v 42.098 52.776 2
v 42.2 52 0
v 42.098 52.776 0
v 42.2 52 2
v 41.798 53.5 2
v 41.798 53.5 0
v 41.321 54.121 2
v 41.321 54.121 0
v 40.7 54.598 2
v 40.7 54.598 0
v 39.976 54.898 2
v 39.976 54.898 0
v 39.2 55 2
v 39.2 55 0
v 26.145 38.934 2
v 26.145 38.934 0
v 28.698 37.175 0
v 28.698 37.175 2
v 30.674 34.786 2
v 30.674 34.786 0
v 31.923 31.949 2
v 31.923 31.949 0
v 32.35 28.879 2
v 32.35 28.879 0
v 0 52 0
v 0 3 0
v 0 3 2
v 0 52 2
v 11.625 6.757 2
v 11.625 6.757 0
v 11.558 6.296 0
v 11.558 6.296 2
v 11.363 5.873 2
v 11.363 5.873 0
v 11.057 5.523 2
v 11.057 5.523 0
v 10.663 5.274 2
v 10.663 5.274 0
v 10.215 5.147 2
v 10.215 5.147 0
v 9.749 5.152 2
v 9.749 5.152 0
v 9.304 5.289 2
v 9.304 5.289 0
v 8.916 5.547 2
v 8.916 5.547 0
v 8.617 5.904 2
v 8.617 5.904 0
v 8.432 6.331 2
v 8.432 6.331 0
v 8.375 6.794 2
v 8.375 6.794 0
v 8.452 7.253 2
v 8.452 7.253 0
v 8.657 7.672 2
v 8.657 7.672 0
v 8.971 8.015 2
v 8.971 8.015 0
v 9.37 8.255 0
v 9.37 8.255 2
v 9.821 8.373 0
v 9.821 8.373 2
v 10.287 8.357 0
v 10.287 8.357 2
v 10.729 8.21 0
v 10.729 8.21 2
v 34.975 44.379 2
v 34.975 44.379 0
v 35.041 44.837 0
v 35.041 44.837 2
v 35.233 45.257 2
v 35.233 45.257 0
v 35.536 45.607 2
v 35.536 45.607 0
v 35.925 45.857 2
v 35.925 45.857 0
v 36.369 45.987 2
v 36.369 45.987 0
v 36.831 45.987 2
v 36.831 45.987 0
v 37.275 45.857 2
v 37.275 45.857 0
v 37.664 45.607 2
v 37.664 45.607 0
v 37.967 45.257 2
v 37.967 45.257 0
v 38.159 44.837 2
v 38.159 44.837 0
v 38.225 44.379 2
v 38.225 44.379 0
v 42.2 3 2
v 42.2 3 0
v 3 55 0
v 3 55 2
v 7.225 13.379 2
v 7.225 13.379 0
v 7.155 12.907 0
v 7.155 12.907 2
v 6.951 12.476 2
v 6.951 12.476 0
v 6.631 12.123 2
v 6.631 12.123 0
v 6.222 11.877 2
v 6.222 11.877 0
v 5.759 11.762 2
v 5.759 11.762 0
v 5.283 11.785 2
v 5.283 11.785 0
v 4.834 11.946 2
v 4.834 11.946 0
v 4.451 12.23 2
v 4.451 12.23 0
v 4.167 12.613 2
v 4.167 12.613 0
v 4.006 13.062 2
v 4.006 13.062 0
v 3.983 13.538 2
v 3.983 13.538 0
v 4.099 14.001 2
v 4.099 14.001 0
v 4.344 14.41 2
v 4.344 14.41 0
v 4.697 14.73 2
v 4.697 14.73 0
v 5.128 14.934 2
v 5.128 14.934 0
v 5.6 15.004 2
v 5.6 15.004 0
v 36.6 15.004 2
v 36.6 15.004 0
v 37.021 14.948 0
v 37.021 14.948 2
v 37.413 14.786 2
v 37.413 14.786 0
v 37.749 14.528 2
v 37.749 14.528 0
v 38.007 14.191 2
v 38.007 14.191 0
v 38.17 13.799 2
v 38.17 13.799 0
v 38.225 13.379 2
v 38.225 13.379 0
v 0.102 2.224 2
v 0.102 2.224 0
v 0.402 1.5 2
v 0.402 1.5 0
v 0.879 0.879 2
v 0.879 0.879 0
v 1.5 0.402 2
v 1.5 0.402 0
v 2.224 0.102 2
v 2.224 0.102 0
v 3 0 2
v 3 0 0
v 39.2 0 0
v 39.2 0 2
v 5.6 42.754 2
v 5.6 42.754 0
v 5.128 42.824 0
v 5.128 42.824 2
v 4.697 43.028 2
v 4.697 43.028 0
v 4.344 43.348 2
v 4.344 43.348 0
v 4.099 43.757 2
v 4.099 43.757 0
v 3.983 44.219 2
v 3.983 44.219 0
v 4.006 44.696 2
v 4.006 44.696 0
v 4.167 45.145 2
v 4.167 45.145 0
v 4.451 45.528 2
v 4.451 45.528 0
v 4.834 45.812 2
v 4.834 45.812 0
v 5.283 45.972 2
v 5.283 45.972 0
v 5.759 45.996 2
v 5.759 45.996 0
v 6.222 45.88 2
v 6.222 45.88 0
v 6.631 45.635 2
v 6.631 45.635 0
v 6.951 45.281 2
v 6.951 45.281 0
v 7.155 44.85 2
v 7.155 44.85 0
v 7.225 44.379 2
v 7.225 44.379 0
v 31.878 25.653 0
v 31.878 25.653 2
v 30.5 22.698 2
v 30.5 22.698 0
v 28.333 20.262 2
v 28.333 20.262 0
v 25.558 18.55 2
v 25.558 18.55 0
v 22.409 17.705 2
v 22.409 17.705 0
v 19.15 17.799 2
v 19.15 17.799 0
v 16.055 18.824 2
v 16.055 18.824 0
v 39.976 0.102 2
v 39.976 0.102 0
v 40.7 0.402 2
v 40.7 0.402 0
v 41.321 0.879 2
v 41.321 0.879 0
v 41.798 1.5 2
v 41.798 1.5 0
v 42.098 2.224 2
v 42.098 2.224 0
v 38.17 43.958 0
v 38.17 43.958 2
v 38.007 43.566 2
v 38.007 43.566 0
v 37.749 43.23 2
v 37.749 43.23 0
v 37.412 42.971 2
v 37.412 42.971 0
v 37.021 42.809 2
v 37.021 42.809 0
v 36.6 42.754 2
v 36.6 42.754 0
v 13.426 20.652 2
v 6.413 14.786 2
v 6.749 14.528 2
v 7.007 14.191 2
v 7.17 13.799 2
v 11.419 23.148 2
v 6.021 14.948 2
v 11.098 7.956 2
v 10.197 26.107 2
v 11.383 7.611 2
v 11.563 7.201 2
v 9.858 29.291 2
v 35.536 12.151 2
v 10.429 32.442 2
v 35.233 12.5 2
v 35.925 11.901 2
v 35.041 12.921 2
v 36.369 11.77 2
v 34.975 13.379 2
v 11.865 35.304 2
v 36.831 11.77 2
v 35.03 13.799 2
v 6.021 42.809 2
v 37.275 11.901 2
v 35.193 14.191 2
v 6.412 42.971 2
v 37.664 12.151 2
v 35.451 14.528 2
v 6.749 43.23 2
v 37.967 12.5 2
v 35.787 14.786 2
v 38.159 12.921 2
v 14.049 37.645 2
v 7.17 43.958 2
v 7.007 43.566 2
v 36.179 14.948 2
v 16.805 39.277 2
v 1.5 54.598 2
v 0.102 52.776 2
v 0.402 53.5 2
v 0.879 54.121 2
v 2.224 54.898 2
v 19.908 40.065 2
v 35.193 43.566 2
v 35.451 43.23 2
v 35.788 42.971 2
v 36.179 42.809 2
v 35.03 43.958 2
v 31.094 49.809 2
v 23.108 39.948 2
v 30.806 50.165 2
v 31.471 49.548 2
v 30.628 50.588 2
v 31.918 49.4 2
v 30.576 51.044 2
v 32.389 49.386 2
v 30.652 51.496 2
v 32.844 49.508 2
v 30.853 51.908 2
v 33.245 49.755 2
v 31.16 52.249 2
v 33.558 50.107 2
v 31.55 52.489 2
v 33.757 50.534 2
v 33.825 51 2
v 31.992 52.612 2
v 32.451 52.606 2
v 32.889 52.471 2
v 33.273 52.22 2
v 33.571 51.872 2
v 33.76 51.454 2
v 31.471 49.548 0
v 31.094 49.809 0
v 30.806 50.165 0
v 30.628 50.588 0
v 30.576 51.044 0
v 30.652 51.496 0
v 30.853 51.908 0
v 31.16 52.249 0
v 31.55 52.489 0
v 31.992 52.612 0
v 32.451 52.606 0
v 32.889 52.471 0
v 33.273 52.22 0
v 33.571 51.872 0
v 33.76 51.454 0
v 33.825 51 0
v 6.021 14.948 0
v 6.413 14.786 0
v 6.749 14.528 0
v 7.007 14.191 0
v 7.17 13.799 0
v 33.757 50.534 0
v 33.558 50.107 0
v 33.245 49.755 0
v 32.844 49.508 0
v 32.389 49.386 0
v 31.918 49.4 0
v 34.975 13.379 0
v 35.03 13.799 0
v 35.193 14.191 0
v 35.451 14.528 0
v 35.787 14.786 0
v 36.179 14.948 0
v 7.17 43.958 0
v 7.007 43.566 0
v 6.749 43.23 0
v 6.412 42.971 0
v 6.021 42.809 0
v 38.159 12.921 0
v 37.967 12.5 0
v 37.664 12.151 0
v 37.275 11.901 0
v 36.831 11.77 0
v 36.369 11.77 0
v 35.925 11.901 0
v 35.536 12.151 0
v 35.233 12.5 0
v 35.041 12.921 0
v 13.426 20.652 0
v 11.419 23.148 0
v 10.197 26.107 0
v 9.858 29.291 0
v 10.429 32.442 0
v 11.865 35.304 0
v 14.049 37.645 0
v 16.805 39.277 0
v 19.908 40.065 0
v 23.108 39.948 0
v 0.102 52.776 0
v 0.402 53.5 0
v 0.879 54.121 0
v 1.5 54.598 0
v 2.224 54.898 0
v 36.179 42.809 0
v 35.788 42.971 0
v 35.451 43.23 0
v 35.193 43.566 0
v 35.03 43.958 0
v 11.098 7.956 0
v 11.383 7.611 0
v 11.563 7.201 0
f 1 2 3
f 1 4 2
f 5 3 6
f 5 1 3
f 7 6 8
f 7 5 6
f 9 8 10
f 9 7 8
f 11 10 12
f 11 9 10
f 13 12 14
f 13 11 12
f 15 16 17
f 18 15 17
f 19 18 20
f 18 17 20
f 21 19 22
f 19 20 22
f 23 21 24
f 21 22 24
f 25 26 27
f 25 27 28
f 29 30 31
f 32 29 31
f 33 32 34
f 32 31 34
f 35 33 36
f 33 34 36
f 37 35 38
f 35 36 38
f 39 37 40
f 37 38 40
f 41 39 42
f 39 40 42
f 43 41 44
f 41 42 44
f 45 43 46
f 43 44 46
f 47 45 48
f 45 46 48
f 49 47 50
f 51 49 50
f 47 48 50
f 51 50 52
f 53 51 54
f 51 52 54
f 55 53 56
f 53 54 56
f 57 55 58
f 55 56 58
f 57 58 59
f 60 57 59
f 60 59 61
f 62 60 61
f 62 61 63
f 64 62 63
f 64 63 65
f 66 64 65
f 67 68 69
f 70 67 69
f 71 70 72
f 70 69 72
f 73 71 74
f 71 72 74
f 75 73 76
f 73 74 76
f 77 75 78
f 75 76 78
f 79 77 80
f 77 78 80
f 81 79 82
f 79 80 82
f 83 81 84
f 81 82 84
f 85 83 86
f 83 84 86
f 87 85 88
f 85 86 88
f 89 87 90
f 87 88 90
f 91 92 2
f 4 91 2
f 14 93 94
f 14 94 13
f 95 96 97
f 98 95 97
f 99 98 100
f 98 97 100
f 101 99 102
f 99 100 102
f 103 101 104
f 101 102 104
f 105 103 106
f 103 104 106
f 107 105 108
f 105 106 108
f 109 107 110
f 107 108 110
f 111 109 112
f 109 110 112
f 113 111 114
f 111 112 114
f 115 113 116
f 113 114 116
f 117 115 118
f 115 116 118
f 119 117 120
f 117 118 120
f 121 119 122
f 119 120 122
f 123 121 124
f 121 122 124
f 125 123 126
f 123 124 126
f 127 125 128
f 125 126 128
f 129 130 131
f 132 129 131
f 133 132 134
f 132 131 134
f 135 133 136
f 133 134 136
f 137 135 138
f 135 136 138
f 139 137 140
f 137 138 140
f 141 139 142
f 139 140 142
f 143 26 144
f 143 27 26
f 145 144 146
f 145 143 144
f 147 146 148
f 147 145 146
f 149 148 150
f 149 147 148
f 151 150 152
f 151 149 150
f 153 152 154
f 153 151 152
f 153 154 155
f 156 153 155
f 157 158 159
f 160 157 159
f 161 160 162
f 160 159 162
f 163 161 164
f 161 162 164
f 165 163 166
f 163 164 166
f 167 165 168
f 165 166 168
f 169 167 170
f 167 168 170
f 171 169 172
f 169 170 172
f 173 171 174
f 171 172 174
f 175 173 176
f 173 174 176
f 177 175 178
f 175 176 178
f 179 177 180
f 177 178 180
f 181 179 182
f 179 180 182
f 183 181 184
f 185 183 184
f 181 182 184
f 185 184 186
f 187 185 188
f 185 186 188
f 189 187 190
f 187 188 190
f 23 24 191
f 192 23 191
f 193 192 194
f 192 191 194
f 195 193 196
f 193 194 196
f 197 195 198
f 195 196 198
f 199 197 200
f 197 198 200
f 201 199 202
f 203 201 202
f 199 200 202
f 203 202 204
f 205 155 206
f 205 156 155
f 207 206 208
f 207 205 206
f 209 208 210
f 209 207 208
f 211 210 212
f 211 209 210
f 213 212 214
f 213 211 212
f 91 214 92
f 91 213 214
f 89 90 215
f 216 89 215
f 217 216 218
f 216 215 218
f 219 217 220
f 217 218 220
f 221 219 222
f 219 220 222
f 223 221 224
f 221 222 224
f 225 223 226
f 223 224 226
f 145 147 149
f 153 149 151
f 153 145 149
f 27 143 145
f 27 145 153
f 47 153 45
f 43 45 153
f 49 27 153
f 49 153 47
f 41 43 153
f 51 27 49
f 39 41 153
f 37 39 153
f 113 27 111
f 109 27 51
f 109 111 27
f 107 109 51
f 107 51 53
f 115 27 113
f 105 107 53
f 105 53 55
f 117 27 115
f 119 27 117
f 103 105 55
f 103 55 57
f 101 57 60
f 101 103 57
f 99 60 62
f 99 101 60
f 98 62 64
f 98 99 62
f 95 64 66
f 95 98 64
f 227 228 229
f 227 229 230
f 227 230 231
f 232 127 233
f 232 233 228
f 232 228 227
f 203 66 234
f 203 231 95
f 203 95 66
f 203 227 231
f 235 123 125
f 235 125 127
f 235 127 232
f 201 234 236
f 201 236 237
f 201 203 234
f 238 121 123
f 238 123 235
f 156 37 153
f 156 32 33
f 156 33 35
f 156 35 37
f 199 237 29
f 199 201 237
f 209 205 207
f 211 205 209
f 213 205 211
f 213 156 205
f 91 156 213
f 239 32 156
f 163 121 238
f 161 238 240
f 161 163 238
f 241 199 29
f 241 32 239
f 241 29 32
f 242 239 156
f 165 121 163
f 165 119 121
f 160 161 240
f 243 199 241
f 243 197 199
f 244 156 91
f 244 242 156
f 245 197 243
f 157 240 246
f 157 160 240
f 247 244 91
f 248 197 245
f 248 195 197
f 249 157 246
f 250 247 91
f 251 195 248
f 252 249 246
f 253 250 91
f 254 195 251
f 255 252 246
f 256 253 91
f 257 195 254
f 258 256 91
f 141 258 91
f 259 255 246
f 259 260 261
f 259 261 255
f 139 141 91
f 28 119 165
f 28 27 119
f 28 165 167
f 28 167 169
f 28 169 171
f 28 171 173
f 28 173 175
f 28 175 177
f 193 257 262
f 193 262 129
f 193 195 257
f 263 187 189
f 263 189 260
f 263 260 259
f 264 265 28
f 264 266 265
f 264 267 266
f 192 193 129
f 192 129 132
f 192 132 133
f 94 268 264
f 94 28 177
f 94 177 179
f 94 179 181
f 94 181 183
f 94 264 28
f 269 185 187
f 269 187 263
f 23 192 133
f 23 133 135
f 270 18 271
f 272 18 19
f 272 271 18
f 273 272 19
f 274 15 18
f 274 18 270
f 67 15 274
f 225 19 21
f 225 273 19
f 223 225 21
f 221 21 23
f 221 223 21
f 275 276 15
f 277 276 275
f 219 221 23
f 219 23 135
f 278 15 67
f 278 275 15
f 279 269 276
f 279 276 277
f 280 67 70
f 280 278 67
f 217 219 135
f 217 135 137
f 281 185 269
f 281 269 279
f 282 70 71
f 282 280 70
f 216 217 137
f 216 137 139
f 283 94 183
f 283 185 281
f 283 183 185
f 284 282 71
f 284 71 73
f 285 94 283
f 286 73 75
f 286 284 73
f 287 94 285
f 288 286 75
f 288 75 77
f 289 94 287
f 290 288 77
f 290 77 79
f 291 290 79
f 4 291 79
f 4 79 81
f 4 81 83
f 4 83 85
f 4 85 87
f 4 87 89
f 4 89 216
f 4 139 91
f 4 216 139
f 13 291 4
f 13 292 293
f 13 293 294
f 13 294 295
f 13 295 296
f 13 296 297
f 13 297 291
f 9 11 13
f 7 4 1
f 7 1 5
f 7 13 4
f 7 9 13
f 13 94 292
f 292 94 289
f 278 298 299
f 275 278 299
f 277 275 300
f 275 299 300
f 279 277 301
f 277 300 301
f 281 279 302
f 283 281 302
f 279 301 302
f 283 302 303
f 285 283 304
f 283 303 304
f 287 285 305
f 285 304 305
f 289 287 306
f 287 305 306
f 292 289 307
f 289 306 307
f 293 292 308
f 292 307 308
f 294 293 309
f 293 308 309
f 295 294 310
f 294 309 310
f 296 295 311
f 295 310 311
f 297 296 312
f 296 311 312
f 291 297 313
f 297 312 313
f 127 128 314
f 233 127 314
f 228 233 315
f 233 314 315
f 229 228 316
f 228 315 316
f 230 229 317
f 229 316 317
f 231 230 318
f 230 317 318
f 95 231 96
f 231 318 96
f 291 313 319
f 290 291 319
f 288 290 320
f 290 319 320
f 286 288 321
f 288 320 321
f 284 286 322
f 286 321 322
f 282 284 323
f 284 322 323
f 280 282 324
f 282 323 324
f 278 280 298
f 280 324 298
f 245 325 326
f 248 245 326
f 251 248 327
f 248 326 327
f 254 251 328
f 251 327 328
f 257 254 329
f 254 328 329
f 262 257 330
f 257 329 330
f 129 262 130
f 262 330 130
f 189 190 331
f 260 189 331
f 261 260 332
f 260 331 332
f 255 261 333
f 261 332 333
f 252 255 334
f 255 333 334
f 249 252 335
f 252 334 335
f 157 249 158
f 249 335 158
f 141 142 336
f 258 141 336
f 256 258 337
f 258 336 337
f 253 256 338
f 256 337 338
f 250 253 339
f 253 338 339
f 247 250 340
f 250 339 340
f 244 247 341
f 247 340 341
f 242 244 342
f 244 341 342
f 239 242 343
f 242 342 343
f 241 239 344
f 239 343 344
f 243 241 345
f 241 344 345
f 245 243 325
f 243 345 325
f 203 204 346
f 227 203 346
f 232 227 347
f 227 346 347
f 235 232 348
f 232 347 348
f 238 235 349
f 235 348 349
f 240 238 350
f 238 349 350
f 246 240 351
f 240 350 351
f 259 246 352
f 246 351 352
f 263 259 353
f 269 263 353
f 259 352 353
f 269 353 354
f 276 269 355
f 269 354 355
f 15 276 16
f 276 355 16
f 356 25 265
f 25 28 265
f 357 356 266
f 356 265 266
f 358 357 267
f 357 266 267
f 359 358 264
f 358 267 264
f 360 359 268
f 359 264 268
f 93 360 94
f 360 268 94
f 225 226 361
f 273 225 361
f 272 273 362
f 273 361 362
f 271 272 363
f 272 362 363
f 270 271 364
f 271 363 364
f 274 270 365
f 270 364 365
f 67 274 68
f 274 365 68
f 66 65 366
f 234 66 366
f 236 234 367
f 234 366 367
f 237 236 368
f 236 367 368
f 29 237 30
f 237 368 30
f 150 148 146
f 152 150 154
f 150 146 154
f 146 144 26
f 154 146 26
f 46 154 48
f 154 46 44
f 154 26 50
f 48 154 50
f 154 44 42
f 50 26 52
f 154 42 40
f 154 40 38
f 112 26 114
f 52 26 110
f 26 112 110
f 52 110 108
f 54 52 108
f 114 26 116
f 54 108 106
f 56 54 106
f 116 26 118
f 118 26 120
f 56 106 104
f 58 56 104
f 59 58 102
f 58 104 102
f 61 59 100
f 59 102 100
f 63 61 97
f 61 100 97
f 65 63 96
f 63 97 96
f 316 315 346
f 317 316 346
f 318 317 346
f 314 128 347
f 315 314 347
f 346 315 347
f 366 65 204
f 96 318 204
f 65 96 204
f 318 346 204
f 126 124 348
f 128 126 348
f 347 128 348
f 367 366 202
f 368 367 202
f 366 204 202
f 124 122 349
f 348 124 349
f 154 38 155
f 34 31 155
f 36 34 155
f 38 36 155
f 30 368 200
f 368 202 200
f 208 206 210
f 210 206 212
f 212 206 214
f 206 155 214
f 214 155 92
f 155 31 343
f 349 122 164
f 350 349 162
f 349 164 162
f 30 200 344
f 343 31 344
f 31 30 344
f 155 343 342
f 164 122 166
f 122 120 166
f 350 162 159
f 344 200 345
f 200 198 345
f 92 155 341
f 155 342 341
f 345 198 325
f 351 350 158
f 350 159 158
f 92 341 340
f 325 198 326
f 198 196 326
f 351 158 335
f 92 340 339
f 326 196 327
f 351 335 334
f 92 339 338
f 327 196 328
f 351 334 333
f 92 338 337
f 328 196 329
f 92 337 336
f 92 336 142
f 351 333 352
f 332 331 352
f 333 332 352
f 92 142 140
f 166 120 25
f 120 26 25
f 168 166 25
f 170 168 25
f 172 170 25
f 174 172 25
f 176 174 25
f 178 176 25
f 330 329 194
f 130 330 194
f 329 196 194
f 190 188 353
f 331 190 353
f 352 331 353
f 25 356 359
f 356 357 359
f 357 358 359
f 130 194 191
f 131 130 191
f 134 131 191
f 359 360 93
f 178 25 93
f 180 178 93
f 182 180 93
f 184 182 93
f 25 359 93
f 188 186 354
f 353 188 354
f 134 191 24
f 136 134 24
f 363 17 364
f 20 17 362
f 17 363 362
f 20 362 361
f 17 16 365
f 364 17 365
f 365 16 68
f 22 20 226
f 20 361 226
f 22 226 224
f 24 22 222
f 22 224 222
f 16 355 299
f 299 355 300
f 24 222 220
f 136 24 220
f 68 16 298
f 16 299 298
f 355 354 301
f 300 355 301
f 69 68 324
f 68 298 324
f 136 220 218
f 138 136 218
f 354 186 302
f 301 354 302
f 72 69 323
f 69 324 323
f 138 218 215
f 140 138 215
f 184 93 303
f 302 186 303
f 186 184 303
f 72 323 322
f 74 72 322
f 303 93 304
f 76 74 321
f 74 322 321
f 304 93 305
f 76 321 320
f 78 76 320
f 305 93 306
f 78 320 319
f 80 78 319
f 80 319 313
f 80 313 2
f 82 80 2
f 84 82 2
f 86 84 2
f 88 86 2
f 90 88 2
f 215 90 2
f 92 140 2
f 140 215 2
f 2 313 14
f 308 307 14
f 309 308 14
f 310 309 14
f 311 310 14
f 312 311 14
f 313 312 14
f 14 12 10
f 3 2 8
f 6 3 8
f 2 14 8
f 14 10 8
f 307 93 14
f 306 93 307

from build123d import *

# Parameters (mm, degrees)
F0_W     = 42.2
F0_H     = 55
F1_DEPTH = 2
F2_R     = 3


with BuildPart() as f1:
    # F0 (on Top) → F1 (new body)
    with BuildSketch(Plane.XY):
        with Locations((21.1, 27.5)):
            Rectangle(F0_W, F0_H)
        with BuildLine():
            ThreePointArc((11.625, 6.7573734957), (8.6170854504, 5.9040433436), (10.7287878788, 8.2097829516))
            ThreePointArc((10.7287878788, 8.2097829516), (11.3829145496, 7.6107036478), (11.625, 6.7573734957))
        make_face(mode=Mode.SUBTRACT)
        with BuildLine():
            Line((7.225, 44.3786867478), (28.8775671832, 44.3786867478))
            Line((28.8775671832, 44.3786867478), (34.975, 44.3786867478))
            ThreePointArc((34.975, 44.3786867478), (36.6, 46.0036867478), (38.225, 44.3786867478))
            ThreePointArc((38.225, 44.3786867478), (37.7490485194, 43.2296382284), (36.6, 42.7536867478))
            Line((36.6, 42.7536867478), (36.6, 15.0036867478))
            ThreePointArc((36.6, 15.0036867478), (37.7490485194, 14.5277352673), (38.225, 13.3786867478))
            ThreePointArc((38.225, 13.3786867478), (36.6, 11.7536867478), (34.975, 13.3786867478))
            Line((34.975, 13.3786867478), (13.3224328168, 13.3786867478))
            Line((13.3224328168, 13.3786867478), (7.225, 13.3786867478))
            ThreePointArc((7.225, 13.3786867478), (4.4509514806, 12.2296382284), (5.6, 15.0036867478))
            Line((5.6, 15.0036867478), (5.6, 42.7536867478))
            ThreePointArc((5.6, 42.7536867478), (4.4509514806, 45.5277352673), (7.225, 44.3786867478))
        make_face(mode=Mode.SUBTRACT)
        with BuildLine():
            ThreePointArc((31.4712121212, 49.5475905441), (31.3466698479, 52.3829145496), (33.825, 51))
            ThreePointArc((33.825, 51), (33.0533301521, 49.6170854504), (31.4712121212, 49.5475905441))
        make_face(mode=Mode.SUBTRACT)
        with BuildLine():
            Line((26.1454545455, 38.9338291352), (28.8775671832, 44.3786867478))
            Line((28.8775671832, 44.3786867478), (7.225, 44.3786867478))
            ThreePointArc((7.225, 44.3786867478), (6.7490485194, 43.2296382284), (5.6, 42.7536867478))
            Line((5.6, 42.7536867478), (5.6, 15.0036867478))
            ThreePointArc((5.6, 15.0036867478), (6.7490485194, 14.5277352673), (7.225, 13.3786867478))
            Line((7.225, 13.3786867478), (13.3224328168, 13.3786867478))
            Line((13.3224328168, 13.3786867478), (16.0545454545, 18.8235443605))
            ThreePointArc((16.0545454545, 18.8235443605), (11.0448576127, 33.9241412933), (26.1454545455, 38.9338291352))
        make_face()
        with BuildLine():
            Line((34.975, 44.3786867478), (28.8775671832, 44.3786867478))
            Line((28.8775671832, 44.3786867478), (26.1454545455, 38.9338291352))
            ThreePointArc((26.1454545455, 38.9338291352), (30.674023805, 34.7863570316), (32.35, 28.8786867478))
            ThreePointArc((32.35, 28.8786867478), (27.0076702838, 19.3046629429), (16.0545454545, 18.8235443605))
            Line((16.0545454545, 18.8235443605), (13.3224328168, 13.3786867478))
            Line((13.3224328168, 13.3786867478), (34.975, 13.3786867478))
            ThreePointArc((34.975, 13.3786867478), (35.4509514806, 14.5277352673), (36.6, 15.0036867478))
            Line((36.6, 15.0036867478), (36.6, 42.7536867478))
            ThreePointArc((36.6, 42.7536867478), (35.4509514806, 43.2296382284), (34.975, 44.3786867478))
        make_face()
    extrude(amount=F1_DEPTH)

    # F2
    f2_edges = [f1.edges().sort_by_distance(p)[0] for p in [
        (42.2, 55, 1),
        (0, 55, 1),
        (0, 0, 1),
        (42.2, 0, 1),
    ]]
    fillet(f2_edges, radius=F2_R)


solid = f1.part
